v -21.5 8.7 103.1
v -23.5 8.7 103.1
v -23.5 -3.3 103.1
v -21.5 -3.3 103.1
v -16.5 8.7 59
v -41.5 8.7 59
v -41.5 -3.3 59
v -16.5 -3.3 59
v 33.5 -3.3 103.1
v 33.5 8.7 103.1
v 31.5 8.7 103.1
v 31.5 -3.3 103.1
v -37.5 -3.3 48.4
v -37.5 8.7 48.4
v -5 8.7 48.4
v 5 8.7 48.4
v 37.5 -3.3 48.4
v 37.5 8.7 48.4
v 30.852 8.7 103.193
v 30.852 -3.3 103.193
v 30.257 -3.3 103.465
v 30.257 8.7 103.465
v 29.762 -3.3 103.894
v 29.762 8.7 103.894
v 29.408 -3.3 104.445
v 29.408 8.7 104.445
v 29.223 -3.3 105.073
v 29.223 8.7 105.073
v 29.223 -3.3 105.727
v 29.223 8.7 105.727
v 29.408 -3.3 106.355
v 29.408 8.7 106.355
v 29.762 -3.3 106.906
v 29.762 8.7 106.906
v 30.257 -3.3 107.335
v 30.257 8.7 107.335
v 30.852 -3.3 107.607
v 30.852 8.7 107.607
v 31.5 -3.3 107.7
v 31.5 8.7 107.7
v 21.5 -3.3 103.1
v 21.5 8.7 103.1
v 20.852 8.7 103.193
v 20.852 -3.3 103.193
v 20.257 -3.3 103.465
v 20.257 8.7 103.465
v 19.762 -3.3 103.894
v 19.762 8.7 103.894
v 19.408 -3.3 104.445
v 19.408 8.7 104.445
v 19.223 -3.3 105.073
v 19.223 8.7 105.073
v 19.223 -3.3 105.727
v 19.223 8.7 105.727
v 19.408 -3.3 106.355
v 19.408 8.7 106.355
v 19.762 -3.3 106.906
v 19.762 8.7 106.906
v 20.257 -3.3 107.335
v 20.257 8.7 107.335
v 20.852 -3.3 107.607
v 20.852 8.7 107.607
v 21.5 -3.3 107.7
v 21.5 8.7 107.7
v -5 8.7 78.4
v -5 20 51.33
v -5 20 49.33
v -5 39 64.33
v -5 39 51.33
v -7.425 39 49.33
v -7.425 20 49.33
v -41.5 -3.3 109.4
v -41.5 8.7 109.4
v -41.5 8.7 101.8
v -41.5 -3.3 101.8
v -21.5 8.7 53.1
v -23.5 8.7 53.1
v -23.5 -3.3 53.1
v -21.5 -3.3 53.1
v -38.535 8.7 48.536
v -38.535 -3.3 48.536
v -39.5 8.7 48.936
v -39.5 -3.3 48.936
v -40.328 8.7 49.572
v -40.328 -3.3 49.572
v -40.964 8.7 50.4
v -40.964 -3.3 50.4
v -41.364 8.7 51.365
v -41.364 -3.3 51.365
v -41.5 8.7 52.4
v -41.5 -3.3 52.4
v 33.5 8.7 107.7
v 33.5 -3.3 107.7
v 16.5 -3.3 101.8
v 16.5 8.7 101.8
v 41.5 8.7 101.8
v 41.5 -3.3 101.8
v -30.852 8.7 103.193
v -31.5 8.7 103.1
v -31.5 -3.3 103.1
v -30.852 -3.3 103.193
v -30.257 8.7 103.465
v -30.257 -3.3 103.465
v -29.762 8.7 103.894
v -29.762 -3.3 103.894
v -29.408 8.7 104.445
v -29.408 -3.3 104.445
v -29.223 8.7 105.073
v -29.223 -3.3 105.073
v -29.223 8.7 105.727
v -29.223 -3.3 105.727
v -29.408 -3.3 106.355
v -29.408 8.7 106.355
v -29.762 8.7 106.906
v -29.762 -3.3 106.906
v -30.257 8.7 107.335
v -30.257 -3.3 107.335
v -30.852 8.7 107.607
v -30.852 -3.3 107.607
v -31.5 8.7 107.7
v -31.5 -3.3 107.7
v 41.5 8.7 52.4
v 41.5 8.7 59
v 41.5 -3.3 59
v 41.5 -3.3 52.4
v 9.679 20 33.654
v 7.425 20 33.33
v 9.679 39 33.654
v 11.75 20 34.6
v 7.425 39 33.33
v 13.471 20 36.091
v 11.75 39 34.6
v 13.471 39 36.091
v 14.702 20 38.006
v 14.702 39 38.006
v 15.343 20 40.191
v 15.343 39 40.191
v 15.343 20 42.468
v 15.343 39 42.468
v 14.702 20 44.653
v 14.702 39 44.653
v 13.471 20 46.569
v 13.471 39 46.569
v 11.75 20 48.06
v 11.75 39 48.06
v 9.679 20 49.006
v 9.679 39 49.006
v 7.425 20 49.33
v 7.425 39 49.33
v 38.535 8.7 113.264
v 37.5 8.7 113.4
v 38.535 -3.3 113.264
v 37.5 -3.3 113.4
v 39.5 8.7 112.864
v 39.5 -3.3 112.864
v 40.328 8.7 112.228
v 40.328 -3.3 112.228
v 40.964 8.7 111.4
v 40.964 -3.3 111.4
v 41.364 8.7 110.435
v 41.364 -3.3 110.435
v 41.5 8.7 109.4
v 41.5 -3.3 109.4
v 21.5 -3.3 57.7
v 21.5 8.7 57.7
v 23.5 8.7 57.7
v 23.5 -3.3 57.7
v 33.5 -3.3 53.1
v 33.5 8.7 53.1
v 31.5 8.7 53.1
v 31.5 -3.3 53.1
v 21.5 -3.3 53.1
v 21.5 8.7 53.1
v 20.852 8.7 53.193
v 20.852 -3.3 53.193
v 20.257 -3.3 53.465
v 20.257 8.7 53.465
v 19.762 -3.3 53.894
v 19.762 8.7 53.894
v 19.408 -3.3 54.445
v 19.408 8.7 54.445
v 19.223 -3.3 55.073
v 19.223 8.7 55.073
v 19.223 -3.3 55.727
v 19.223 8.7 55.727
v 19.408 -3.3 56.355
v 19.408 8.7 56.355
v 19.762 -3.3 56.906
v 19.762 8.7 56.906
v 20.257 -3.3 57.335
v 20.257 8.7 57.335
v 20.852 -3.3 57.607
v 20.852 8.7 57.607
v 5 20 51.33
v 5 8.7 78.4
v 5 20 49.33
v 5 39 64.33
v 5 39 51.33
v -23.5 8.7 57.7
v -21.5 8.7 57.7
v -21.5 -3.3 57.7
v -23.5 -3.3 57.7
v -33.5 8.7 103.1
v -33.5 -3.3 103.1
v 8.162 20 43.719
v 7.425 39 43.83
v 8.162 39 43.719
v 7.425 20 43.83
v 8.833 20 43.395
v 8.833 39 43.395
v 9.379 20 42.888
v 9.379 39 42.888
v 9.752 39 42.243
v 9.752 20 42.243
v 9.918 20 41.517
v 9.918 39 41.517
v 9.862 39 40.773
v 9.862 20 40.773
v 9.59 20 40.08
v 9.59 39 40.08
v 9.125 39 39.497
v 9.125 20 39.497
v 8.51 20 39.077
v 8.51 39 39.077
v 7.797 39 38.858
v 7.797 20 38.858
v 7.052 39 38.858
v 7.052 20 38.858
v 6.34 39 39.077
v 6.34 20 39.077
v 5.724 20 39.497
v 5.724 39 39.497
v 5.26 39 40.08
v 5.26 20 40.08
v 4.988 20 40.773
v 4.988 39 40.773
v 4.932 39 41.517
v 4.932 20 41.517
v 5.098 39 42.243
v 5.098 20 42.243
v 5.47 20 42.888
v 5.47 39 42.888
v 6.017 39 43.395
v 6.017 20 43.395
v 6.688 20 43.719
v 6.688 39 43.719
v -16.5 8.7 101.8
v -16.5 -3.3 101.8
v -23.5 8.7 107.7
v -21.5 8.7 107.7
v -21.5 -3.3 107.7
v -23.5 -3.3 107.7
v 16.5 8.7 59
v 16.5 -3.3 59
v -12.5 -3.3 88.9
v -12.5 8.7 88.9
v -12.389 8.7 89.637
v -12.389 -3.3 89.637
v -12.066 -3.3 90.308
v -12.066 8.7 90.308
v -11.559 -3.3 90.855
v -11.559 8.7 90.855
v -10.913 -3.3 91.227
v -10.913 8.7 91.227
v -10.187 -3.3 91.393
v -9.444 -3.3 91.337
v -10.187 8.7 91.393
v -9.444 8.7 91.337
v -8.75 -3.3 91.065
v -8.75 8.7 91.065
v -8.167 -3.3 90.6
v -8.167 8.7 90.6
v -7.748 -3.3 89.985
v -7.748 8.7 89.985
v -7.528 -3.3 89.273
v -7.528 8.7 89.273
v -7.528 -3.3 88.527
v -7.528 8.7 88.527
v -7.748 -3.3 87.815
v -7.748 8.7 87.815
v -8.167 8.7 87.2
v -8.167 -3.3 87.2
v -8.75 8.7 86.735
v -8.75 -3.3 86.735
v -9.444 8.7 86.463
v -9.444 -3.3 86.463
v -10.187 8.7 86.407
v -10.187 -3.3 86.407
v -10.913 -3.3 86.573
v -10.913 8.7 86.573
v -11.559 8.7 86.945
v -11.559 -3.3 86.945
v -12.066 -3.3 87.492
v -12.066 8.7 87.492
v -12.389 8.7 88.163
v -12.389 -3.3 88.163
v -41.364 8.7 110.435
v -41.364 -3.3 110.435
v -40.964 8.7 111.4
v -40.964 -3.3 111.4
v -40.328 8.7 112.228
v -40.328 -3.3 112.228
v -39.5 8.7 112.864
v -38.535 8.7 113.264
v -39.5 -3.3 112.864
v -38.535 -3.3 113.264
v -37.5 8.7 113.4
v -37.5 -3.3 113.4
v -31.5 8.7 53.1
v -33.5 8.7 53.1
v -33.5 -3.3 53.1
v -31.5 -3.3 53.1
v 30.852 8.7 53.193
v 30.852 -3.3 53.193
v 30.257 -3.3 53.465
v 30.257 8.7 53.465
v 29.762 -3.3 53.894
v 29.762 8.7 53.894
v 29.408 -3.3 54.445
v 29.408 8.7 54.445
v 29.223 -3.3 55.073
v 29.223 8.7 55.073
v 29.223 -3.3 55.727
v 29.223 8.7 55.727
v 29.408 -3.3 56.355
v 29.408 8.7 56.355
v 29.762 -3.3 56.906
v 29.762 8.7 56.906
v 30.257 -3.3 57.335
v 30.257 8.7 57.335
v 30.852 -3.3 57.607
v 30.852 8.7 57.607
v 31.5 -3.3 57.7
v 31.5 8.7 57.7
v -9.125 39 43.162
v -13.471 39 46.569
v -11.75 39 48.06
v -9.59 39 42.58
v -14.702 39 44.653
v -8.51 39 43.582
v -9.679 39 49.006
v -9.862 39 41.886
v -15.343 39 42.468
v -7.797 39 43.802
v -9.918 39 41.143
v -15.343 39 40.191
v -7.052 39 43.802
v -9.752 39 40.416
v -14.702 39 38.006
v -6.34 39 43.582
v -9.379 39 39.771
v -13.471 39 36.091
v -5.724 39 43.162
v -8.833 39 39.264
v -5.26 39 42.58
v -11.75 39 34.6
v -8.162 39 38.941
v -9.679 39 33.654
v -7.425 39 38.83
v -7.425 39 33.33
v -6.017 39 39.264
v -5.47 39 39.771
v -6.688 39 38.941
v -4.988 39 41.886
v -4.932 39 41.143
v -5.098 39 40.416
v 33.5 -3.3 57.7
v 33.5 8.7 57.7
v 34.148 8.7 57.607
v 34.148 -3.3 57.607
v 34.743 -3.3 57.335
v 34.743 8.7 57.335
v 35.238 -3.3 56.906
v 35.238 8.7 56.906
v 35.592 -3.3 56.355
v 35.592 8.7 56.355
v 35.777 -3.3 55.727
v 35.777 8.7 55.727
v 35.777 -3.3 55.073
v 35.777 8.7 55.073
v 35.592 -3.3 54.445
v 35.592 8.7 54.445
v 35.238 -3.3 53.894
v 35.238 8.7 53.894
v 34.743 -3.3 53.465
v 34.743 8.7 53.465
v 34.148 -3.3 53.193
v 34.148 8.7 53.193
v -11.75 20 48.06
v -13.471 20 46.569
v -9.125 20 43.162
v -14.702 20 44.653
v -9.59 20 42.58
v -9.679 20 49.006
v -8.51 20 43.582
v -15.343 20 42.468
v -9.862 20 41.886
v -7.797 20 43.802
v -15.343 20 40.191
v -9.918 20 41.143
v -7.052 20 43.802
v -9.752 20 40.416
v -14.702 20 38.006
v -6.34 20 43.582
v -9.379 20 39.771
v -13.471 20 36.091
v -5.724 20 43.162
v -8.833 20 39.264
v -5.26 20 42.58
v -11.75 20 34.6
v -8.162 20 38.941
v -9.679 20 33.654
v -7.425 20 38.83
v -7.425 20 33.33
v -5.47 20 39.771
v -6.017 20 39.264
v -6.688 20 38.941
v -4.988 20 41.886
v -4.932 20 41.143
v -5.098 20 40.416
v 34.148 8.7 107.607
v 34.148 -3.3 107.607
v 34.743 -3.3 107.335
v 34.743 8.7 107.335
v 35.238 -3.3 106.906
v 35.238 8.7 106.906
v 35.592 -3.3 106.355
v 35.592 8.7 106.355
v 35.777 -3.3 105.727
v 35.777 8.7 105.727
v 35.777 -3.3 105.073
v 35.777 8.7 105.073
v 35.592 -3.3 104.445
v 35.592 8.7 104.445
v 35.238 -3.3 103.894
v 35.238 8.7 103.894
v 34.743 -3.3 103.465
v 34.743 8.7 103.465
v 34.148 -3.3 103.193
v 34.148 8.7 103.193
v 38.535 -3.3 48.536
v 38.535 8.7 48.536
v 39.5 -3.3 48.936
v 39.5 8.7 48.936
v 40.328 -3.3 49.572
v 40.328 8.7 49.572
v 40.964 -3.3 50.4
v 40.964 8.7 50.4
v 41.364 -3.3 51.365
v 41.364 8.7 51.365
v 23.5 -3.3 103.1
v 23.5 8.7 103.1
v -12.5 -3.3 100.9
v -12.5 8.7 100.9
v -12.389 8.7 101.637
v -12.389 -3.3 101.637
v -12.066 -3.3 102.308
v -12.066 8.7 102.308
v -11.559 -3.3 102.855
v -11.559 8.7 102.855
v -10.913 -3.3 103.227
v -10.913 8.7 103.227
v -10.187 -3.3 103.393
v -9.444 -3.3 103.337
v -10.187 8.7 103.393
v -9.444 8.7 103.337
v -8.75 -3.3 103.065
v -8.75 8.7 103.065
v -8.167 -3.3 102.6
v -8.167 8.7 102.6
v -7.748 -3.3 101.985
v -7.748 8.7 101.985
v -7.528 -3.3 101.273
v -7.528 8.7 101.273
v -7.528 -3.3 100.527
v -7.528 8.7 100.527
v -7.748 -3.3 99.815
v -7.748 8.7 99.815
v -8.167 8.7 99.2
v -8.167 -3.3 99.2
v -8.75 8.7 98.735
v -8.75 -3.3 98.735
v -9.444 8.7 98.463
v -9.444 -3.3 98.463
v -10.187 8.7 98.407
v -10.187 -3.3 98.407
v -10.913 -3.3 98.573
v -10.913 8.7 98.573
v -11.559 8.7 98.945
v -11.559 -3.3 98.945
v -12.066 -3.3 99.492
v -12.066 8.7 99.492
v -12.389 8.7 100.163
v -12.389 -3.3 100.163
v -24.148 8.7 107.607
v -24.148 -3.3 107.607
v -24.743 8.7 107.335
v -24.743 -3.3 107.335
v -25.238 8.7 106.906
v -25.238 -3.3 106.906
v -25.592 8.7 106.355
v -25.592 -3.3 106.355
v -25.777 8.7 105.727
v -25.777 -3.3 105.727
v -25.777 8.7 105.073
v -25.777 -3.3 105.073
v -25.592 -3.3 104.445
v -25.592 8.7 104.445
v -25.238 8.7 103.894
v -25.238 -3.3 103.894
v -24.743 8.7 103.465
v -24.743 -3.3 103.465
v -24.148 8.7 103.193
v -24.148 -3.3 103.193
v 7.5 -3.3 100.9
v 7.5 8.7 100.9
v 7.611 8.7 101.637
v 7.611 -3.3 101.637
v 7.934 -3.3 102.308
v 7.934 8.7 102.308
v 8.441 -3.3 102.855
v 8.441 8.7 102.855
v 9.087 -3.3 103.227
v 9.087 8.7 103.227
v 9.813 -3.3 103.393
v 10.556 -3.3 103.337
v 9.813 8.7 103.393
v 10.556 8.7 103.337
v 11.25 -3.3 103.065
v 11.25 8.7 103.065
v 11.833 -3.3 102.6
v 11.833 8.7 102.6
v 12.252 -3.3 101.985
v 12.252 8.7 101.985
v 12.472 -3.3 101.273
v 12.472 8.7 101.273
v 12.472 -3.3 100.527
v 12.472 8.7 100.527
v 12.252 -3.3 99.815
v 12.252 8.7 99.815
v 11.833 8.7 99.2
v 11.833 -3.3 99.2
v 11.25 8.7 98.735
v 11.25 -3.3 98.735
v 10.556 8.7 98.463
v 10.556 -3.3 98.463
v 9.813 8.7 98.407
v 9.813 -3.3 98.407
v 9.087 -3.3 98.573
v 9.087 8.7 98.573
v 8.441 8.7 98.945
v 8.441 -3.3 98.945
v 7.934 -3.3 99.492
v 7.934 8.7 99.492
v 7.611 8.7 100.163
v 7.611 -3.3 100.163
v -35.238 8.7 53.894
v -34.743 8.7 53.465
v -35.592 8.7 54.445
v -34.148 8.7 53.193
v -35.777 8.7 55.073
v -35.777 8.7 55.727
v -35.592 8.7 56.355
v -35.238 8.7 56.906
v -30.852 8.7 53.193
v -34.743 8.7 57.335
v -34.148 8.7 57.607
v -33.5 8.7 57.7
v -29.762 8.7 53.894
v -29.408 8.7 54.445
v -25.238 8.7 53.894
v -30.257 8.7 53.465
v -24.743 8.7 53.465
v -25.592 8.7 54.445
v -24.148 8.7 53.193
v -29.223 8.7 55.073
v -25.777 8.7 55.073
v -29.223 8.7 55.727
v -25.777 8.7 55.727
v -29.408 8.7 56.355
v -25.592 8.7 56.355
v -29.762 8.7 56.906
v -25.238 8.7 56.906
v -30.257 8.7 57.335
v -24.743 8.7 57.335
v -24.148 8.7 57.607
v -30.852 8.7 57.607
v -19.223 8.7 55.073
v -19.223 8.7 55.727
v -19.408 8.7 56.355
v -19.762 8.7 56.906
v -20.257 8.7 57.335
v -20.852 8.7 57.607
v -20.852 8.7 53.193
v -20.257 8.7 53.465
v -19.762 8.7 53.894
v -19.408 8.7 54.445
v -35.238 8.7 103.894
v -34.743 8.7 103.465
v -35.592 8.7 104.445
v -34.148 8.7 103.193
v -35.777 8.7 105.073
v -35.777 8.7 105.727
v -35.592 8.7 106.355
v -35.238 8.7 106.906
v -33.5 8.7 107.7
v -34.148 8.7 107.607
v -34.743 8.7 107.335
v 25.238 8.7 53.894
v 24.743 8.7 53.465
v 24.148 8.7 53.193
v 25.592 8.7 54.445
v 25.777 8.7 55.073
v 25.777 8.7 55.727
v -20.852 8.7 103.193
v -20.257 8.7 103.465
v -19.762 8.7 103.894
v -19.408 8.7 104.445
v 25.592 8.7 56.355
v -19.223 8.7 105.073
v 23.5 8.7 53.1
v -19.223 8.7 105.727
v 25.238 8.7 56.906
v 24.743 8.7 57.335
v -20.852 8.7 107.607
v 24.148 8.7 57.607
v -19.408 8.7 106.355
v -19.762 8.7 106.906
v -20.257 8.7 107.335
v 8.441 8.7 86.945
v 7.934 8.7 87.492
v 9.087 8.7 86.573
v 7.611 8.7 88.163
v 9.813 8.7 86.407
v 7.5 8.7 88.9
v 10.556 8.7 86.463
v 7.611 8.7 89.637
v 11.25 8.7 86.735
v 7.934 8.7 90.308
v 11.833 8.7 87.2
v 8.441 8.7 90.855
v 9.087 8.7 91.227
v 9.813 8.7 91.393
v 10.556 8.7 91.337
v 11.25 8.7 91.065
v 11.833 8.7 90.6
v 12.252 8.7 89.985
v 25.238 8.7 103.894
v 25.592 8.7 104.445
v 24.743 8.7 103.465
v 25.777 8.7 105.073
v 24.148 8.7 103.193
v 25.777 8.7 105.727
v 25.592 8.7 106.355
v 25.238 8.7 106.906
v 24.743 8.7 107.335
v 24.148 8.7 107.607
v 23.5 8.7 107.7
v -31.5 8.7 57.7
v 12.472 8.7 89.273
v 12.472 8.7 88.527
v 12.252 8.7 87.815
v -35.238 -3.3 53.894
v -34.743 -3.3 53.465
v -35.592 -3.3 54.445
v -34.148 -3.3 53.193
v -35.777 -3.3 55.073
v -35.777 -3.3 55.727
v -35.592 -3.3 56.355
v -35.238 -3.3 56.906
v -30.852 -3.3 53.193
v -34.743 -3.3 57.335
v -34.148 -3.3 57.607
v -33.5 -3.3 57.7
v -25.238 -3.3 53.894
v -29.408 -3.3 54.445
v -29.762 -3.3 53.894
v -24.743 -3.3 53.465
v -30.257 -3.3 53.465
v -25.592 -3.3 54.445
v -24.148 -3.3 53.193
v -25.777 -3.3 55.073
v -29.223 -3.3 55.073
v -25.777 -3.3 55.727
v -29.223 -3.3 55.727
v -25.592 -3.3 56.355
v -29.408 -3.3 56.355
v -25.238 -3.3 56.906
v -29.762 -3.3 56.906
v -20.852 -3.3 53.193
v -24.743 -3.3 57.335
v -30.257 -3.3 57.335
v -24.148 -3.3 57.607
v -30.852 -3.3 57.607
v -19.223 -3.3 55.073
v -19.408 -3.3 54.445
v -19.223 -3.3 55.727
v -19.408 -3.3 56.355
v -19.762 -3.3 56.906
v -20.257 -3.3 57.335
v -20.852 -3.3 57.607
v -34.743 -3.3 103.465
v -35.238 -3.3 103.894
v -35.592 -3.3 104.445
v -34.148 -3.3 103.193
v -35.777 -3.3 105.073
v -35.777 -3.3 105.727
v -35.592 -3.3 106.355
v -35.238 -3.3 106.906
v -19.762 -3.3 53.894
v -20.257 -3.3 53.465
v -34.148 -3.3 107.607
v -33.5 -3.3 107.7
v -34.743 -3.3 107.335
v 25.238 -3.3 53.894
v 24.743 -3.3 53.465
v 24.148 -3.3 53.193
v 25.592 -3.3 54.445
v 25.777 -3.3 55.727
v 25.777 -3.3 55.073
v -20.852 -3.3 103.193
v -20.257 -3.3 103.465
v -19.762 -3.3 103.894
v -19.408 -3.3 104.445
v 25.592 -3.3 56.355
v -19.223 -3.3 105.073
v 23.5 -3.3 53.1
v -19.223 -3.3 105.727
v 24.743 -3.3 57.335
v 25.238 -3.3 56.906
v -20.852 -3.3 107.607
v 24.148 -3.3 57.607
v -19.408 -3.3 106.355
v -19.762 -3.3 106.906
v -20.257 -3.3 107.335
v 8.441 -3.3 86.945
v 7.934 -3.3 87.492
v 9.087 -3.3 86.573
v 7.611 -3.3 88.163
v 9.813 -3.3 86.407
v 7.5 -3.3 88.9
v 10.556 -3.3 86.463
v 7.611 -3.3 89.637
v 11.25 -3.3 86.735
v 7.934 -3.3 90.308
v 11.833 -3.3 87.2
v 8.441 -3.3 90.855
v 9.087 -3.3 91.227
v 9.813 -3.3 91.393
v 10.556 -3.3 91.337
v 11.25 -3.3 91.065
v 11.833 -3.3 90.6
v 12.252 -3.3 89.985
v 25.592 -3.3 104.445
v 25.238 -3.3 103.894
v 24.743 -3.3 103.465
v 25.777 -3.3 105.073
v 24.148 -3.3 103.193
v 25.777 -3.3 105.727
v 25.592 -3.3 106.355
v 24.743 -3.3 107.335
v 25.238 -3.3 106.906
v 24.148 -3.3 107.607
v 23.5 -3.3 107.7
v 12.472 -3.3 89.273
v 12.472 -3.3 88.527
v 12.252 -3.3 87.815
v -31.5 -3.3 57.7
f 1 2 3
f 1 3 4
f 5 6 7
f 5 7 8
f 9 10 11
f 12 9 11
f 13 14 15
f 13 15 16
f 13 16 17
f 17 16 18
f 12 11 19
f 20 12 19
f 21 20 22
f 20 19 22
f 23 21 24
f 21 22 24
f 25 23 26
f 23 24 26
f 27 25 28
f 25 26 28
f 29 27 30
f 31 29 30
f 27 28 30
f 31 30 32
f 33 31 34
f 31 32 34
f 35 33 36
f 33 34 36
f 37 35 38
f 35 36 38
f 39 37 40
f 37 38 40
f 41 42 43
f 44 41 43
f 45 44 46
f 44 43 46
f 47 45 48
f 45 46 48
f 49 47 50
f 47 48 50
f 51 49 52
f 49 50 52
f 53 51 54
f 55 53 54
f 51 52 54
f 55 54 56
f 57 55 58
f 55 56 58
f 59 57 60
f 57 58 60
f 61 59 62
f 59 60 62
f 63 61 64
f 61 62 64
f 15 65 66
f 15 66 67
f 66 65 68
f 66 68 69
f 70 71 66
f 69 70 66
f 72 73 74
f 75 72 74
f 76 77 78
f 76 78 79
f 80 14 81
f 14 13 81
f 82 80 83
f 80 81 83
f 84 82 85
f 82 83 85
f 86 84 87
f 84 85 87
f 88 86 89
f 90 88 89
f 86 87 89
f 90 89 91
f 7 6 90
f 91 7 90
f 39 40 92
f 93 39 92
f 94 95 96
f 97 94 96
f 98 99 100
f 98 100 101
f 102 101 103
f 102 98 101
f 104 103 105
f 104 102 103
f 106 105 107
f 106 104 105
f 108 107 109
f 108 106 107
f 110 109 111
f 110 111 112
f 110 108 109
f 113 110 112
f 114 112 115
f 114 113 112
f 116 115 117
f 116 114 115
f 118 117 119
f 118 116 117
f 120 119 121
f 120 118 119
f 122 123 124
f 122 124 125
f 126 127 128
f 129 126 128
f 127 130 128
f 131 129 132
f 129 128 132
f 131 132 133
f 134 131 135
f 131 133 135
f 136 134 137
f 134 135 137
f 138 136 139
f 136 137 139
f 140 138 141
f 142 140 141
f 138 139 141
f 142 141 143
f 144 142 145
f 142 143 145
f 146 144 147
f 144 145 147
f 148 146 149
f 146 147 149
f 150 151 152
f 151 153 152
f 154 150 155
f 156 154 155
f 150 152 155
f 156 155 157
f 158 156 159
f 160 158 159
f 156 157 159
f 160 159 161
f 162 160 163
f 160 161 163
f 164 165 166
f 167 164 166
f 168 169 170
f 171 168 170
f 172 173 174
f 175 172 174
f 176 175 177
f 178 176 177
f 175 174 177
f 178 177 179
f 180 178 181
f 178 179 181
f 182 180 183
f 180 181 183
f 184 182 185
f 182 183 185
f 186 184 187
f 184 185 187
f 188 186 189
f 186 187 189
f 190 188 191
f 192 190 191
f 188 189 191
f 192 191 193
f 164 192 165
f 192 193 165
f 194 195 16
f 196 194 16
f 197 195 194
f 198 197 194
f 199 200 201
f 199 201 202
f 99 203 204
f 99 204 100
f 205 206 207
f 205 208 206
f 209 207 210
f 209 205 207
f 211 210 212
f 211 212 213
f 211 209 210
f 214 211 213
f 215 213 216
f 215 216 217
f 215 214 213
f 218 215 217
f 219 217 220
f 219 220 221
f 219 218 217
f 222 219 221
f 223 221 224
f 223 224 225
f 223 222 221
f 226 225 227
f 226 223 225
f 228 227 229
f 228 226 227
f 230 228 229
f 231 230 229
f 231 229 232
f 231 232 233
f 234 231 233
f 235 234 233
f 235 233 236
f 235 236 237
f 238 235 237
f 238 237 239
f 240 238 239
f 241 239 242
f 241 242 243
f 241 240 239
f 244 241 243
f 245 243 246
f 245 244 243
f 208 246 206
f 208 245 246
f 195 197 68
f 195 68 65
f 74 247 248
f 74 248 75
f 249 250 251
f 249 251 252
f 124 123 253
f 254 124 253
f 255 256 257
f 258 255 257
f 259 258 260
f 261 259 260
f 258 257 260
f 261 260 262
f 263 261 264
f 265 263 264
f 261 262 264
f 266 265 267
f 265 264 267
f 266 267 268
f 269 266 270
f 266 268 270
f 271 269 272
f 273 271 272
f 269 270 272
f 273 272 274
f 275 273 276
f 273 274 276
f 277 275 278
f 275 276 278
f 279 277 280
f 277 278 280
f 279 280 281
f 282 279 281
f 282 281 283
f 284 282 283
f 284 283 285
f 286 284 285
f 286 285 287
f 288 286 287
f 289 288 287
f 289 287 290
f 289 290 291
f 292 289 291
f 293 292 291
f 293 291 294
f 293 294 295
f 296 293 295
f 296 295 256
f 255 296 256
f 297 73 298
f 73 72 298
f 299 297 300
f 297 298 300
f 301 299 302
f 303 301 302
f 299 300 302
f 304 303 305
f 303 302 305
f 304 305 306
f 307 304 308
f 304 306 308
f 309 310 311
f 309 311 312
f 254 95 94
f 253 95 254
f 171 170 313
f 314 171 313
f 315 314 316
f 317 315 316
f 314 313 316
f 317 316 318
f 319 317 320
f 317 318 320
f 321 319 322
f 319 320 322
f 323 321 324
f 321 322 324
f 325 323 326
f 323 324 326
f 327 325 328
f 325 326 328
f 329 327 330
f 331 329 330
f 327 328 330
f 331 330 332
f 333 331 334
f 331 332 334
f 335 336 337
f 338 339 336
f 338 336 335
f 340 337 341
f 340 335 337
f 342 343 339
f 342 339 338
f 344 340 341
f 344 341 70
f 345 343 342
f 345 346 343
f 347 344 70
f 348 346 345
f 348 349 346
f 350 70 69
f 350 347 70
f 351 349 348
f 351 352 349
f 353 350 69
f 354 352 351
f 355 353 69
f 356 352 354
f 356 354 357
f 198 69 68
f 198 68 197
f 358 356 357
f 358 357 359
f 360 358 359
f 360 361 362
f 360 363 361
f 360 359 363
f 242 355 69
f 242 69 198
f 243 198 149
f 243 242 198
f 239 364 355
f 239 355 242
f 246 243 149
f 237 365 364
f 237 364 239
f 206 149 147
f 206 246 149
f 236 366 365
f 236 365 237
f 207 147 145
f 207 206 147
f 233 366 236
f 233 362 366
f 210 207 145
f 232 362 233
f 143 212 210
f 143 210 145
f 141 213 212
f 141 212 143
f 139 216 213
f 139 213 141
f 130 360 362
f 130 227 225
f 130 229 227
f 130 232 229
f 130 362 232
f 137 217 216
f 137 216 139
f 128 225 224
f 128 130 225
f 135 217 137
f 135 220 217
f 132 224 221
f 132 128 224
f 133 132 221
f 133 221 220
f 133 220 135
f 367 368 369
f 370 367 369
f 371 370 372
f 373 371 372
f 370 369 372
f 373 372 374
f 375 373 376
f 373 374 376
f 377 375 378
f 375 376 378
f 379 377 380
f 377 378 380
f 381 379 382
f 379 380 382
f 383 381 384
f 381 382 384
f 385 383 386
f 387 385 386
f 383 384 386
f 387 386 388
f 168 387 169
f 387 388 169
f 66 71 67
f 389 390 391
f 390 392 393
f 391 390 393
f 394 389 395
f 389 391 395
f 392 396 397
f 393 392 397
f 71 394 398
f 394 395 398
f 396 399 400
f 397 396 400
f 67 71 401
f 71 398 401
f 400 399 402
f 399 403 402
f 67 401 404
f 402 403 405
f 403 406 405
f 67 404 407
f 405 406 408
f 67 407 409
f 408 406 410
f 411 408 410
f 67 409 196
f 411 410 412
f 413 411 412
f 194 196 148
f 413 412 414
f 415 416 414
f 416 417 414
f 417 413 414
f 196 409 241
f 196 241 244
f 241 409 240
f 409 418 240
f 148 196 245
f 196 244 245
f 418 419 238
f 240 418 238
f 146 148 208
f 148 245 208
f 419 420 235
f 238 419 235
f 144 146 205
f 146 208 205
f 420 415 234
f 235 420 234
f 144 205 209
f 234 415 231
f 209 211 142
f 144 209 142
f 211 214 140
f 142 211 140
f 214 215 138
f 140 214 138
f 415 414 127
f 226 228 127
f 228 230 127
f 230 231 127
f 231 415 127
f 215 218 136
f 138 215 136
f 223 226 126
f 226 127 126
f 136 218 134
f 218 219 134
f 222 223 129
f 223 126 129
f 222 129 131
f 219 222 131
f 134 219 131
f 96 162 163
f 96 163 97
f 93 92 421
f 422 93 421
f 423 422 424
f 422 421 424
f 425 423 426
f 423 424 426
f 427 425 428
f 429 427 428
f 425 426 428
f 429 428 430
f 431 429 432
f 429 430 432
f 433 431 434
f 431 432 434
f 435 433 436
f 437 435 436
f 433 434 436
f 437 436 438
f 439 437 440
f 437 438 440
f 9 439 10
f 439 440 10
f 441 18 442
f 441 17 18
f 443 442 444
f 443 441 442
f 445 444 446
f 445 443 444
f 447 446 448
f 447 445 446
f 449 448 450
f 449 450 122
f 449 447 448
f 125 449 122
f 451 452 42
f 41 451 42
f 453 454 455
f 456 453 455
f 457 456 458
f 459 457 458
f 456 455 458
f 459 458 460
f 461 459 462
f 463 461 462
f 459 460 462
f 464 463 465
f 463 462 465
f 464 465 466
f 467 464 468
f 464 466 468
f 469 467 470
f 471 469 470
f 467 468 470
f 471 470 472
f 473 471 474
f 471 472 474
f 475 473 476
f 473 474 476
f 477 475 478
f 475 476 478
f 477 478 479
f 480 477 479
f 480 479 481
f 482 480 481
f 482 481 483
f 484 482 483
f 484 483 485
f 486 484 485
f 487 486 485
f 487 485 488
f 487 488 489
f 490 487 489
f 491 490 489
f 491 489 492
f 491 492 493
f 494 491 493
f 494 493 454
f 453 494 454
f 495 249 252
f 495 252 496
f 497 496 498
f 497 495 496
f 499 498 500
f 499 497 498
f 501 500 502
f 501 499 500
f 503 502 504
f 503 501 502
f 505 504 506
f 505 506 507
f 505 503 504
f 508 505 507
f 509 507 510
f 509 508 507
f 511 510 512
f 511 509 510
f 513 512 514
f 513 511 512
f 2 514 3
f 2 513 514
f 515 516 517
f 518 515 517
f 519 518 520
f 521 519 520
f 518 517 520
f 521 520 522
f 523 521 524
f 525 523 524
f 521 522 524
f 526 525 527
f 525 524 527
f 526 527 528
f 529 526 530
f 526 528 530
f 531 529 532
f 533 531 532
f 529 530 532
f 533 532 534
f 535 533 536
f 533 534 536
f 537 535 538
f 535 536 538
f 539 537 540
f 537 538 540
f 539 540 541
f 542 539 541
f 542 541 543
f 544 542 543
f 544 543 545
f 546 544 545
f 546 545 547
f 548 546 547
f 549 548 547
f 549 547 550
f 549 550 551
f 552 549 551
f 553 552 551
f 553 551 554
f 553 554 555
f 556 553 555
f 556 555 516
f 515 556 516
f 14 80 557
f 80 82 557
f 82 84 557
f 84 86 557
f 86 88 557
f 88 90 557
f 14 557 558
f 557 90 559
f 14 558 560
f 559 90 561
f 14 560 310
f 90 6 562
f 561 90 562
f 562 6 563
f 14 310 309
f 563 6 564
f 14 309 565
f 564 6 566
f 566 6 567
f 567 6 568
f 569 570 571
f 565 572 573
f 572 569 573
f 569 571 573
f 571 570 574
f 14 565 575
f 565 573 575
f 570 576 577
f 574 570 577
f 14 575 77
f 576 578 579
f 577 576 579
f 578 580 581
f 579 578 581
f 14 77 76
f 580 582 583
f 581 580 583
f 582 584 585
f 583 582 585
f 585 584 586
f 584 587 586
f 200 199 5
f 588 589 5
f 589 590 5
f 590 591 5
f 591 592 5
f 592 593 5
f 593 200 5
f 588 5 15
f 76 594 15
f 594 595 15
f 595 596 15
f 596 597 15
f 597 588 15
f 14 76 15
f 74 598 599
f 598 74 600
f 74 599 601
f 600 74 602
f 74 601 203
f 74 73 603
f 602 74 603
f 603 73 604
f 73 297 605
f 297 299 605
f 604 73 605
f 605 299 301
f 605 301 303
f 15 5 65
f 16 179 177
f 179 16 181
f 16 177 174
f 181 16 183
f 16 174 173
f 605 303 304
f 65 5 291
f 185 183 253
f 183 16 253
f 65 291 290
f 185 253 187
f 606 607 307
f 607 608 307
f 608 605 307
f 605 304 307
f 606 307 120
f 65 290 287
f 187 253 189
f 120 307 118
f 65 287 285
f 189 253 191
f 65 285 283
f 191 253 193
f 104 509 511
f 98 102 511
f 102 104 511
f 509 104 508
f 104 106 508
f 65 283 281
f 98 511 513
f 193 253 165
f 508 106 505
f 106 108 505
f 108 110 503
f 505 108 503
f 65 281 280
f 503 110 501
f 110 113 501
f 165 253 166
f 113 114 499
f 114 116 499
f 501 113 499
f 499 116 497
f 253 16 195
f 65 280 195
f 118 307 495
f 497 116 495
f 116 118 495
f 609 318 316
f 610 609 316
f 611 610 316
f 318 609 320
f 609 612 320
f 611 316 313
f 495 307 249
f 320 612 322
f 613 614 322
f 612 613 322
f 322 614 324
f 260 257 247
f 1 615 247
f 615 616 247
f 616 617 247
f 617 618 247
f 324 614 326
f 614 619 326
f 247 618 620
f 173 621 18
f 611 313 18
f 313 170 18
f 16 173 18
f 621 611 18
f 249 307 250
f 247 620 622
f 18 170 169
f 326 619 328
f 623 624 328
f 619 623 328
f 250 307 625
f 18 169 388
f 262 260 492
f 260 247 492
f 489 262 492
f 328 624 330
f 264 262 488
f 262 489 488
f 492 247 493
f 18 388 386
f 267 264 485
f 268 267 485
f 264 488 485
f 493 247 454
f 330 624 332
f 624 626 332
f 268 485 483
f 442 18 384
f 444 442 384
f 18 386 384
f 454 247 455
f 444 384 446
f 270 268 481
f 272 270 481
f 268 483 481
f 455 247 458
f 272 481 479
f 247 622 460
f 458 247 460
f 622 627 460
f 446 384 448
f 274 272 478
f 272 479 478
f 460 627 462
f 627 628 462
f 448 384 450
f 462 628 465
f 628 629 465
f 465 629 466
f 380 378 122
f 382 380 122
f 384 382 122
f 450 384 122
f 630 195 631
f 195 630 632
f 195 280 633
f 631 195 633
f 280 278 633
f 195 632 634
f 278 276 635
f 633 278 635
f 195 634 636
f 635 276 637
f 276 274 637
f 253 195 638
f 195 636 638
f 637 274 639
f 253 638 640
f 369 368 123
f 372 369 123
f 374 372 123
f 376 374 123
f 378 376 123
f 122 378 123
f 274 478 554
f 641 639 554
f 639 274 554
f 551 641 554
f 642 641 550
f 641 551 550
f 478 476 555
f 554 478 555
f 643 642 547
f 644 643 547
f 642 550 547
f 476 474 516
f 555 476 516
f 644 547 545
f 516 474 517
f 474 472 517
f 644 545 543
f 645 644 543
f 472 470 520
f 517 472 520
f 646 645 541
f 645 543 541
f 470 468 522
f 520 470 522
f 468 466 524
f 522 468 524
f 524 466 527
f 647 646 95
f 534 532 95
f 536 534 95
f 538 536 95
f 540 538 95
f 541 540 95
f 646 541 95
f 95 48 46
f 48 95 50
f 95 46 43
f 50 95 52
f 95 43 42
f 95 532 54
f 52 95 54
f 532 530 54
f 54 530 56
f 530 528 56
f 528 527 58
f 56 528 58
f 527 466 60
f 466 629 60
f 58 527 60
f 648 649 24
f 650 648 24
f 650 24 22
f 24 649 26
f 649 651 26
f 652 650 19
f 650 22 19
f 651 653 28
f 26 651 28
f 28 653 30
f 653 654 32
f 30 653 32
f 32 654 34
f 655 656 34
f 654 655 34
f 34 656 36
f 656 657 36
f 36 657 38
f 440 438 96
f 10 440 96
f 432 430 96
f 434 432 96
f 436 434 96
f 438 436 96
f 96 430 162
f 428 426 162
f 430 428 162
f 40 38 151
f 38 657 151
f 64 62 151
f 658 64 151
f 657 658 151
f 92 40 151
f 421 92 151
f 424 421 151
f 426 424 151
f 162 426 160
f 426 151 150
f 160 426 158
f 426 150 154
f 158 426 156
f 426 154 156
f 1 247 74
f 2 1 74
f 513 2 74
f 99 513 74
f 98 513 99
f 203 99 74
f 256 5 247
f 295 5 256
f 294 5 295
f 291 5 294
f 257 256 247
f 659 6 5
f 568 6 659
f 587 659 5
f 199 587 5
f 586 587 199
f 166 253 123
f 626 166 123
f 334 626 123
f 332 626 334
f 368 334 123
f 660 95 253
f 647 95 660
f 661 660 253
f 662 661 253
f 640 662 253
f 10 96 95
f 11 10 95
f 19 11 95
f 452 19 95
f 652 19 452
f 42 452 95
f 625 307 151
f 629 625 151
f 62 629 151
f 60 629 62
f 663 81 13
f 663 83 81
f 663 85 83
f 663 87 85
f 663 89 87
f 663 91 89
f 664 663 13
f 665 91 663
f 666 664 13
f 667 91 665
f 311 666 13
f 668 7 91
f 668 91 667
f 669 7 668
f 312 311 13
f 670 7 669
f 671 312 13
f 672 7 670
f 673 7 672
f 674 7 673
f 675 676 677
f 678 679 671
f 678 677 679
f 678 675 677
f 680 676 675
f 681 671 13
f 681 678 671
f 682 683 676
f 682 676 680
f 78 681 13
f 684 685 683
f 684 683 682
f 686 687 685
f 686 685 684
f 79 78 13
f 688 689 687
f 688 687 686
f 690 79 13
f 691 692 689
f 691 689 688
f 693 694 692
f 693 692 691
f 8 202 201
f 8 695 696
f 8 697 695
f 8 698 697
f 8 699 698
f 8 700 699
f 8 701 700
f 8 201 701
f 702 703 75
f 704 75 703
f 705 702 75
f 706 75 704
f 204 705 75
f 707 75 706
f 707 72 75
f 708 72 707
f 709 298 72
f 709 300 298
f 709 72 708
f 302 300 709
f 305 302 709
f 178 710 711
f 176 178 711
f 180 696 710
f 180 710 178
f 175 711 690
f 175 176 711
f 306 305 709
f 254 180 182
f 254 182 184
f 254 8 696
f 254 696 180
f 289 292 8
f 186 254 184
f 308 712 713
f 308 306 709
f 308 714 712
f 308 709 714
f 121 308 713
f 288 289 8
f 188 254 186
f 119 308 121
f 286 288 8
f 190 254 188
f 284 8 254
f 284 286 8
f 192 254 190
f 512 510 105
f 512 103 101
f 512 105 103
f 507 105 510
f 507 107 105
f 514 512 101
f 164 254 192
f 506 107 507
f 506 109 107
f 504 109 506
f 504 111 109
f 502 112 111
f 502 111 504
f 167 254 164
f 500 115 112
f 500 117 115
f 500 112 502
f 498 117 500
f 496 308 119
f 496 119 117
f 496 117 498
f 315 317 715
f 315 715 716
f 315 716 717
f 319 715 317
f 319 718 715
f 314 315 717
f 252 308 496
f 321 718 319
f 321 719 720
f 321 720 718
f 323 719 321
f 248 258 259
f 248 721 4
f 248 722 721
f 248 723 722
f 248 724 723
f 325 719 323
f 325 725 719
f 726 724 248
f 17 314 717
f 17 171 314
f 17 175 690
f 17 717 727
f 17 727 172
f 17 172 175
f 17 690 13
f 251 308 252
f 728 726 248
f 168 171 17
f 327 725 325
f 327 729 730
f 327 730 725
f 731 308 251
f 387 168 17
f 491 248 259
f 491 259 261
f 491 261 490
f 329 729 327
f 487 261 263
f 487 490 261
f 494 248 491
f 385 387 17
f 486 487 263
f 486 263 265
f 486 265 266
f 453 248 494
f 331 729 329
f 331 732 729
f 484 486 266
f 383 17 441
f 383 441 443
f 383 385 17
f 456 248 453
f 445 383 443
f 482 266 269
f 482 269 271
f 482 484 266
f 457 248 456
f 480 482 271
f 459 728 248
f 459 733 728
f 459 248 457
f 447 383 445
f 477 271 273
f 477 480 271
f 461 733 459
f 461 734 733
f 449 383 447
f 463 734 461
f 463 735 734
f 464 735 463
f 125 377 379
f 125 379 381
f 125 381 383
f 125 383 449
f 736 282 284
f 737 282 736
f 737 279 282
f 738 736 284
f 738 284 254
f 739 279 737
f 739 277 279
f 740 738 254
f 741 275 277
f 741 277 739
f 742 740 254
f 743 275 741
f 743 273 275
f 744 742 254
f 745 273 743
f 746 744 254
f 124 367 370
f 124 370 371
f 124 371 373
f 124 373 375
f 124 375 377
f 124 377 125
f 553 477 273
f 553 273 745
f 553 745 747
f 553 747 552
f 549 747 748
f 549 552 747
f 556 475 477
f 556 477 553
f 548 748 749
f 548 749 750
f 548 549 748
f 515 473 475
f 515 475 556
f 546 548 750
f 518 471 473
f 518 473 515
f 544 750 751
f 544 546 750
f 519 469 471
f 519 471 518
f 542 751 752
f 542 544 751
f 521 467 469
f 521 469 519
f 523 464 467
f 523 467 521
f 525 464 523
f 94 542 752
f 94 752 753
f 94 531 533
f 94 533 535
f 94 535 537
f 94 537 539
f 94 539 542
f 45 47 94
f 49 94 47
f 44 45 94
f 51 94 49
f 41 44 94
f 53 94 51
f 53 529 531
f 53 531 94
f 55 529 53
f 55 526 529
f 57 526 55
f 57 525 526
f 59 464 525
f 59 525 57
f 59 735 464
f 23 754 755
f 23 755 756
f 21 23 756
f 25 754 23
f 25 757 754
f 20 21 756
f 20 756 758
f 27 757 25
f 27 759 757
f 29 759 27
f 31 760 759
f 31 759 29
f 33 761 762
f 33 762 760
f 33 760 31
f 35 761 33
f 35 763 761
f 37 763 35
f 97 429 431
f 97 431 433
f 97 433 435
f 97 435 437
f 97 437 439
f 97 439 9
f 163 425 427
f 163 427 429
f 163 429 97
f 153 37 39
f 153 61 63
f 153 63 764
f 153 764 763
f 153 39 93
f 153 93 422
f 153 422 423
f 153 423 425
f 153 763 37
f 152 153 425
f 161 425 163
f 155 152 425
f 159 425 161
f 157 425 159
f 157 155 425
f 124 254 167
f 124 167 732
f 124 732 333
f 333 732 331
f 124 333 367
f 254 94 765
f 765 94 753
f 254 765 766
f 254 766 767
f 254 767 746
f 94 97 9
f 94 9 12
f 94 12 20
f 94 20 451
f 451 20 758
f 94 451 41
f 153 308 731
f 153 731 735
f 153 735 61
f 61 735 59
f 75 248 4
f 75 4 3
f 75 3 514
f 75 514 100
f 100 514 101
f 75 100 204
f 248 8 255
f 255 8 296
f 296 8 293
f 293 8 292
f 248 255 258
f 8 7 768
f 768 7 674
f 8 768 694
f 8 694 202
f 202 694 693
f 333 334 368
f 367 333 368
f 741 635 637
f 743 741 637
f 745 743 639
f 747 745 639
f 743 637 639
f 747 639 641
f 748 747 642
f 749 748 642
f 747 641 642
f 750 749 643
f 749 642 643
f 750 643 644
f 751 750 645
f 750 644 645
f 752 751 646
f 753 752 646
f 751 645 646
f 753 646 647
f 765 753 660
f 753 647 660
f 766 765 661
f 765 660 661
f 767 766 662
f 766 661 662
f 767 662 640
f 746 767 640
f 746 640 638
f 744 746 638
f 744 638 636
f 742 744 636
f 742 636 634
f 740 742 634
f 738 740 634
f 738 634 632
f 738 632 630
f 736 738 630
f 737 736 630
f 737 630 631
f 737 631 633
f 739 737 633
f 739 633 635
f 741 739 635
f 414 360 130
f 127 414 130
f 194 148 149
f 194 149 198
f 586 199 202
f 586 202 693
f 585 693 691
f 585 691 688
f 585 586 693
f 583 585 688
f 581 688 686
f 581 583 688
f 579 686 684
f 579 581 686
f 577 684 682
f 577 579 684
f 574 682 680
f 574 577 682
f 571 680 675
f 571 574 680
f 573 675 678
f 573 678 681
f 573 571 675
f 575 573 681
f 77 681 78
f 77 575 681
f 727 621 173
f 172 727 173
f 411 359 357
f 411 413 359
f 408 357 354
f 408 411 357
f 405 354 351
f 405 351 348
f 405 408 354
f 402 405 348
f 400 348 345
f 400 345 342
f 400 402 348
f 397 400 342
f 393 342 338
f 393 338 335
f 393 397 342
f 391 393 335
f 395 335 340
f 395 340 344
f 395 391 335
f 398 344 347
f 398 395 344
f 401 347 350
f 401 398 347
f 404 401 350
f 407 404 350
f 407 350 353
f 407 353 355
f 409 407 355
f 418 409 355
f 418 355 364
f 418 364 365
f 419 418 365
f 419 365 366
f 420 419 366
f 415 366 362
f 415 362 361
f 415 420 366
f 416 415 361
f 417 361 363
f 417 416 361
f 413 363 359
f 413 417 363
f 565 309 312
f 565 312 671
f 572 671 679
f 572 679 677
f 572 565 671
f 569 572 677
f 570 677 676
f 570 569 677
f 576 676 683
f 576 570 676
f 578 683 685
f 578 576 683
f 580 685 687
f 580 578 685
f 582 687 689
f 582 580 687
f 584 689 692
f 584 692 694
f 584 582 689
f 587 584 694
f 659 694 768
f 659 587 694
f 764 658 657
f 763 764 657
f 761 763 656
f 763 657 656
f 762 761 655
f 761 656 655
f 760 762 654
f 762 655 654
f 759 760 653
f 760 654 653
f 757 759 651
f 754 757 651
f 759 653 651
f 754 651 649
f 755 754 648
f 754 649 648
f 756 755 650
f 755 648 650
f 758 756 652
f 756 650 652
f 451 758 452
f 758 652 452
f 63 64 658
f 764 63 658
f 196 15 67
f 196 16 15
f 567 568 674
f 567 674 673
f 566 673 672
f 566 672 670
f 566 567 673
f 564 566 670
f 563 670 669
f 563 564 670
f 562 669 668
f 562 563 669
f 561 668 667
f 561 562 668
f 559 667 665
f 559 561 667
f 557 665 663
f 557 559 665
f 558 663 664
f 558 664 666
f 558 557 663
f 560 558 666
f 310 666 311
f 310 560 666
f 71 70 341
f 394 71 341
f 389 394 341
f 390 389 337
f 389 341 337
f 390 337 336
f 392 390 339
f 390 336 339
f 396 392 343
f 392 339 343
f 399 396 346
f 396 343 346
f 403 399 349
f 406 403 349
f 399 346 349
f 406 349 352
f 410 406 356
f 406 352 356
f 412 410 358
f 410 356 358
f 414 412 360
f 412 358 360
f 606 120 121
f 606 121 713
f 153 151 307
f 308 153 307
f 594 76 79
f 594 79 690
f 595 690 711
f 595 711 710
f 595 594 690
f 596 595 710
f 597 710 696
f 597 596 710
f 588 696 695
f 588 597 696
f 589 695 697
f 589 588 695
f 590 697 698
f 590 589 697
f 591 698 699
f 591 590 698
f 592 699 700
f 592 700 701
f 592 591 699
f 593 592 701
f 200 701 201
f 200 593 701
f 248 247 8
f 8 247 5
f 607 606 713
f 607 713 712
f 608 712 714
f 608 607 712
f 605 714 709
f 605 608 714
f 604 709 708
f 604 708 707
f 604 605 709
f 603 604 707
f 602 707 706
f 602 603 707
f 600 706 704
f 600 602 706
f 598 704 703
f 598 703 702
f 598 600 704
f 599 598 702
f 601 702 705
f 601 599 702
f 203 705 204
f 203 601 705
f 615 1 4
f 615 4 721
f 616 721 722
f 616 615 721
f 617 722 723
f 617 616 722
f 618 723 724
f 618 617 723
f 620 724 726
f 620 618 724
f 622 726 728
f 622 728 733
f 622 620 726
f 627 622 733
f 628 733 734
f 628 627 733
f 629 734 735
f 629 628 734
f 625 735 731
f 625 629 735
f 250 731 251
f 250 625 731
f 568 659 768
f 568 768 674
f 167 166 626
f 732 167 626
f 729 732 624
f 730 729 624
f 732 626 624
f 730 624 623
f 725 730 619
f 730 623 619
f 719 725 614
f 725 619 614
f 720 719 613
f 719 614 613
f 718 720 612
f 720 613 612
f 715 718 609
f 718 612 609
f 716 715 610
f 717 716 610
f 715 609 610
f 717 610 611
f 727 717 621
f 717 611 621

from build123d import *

# Parameters (mm, degrees)
BOSS_EXTRU_1_DEPTH      = 12
ESQUISSE6_R             = 2.5
BOSS_EXTRU_2_DEPTH      = 9.5
BOSS_EXTRU_3_DEPTH      = 5
CONG_1_R                = 4
ESQUISSE8_R             = 2.5
ENL_V_MAT_EXTRU_1_DEPTH = 125.49859437
BOSS_EXTRU_4_DEPTH      = 19


with BuildPart() as part:
    # Esquisse1 → Boss.-Extru.1 (new body)
    with BuildSketch(Plane.XZ.offset(-8.7)):
        Polygon((38.5, 59), (41.5, 59), (41.5, 48.4), (0, 48.4), (0, 113.4), (41.5, 113.4), (41.5, 101.8), (38.5, 101.8), (16.5, 101.8), (16.5, 59), align=None)
        with BuildLine():
            Line((21.5, 57.7), (23.5, 57.7))
            ThreePointArc((23.5, 57.7), (25.8, 55.4), (23.5, 53.1))
            Line((23.5, 53.1), (21.5, 53.1))
            ThreePointArc((21.5, 53.1), (19.2, 55.4), (21.5, 57.7))
        make_face(mode=Mode.SUBTRACT)
        with BuildLine():
            Line((31.5, 57.7), (33.5, 57.7))
            ThreePointArc((33.5, 57.7), (35.8, 55.4), (33.5, 53.1))
            Line((33.5, 53.1), (31.5, 53.1))
            ThreePointArc((31.5, 53.1), (29.2, 55.4), (31.5, 57.7))
        make_face(mode=Mode.SUBTRACT)
        with BuildLine():
            Line((21.5, 107.7), (23.5, 107.7))
            ThreePointArc((23.5, 107.7), (25.8, 105.4), (23.5, 103.1))
            Line((23.5, 103.1), (21.5, 103.1))
            ThreePointArc((21.5, 103.1), (19.2, 105.4), (21.5, 107.7))
        make_face(mode=Mode.SUBTRACT)
        with BuildLine():
            Line((31.5, 107.7), (33.5, 107.7))
            ThreePointArc((33.5, 107.7), (35.8, 105.4), (33.5, 103.1))
            Line((33.5, 103.1), (31.5, 103.1))
            ThreePointArc((31.5, 103.1), (29.2, 105.4), (31.5, 107.7))
        make_face(mode=Mode.SUBTRACT)
    boss_extru_1 = extrude(amount=BOSS_EXTRU_1_DEPTH)

    # Symétrie1: Boss.-Extru.1 across plane
    add(boss_extru_1.mirror(Plane(origin=(0, 0, 0), x_dir=(0, 0, 1), z_dir=(1, 0, 0))))



with BuildPart() as body_2:
    # Esquisse6 → Boss.-Extru.2 (new, symmetric)
    with BuildSketch(Plane(origin=(0, 29.5, 0), x_dir=(1, 0, 0), z_dir=(0, 1, 0))):
        with BuildLine():
            Line((-7.424824728, -33.32967845), (7.424824728, -33.32967845))
            ThreePointArc((7.424824728, -33.32967845), (15.424824728, -41.32967845), (7.424824728, -49.32967845))
            Line((7.424824728, -49.32967845), (-7.424824728, -49.32967845))
            ThreePointArc((-7.424824728, -49.32967845), (-15.424824728, -41.32967845), (-7.424824728, -33.32967845))
        make_face()
        with Locations(Location((7.424824728, -41.32967845, 0), (0, 0, 270))):
            Circle(ESQUISSE6_R, mode=Mode.SUBTRACT)
        with Locations(Location((-7.424824728, -41.32967845, 0), (0, 0, 90))):
            Circle(ESQUISSE6_R, mode=Mode.SUBTRACT)
    extrude(amount=BOSS_EXTRU_2_DEPTH, both=True)


with BuildPart() as part_1:
    add(part.part)

    add(body_2.part)  # Boss.-Extru.3 merges body 2
    # Esquisse7 → Boss.-Extru.3 (add, symmetric)
    with BuildSketch(Plane(origin=(0, 0, 0), x_dir=(0, 0, -1), z_dir=(1, 0, 0))):
        Polygon((-49.32967845, 20), (-49.32967845, 39), (-64.32967845, 39), (-78.4, 8.7), (-48.4, 8.7), align=None)
    extrude(amount=BOSS_EXTRU_3_DEPTH, both=True)

    # Congé1
    cong_1_edges = [part_1.edges().sort_by_distance(p)[0] for p in [
        (41.5, 2.7, 48.4),
        (41.5, 2.7, 113.4),
        (-41.5, 2.7, 48.4),
        (-41.5, 2.7, 113.4),
    ]]
    fillet(cong_1_edges, radius=CONG_1_R)

    # Esquisse8 → Enlèv. mat.-Extru.1 (cut, through all)
    with BuildSketch(Plane(origin=(0, 8.7, 0), x_dir=(1, 0, 0), z_dir=(0, 1, 0))):
        with Locations(Location((-10, -88.9, 0), (0, 0, 180))):
            Circle(ESQUISSE8_R)
        with Locations(Location((-10, -100.9, 0), (0, 0, 180))):
            Circle(ESQUISSE8_R)
        with Locations(Location((10, -100.9, 0), (0, 0, 180))):
            Circle(ESQUISSE8_R)
        with Locations(Location((10, -88.9, 0), (0, 0, 180))):
            Circle(ESQUISSE8_R)
    extrude(amount=-ENL_V_MAT_EXTRU_1_DEPTH, mode=Mode.SUBTRACT)

    # Esquisse9 → Boss.-Extru.4 (add)
    with BuildSketch(Plane(origin=(0, 39, 0), x_dir=(1, 0, 0), z_dir=(0, 1, 0))):
        Polygon((-7.424824728, -49.32967845), (-5, -51.32967845), (-5, -49.32967845), align=None)
        Polygon((5, -51.32967845), (5, -49.32967845), (7.424824728, -49.32967845), align=None)
    extrude(amount=-BOSS_EXTRU_4_DEPTH)


solid = part_1.part
